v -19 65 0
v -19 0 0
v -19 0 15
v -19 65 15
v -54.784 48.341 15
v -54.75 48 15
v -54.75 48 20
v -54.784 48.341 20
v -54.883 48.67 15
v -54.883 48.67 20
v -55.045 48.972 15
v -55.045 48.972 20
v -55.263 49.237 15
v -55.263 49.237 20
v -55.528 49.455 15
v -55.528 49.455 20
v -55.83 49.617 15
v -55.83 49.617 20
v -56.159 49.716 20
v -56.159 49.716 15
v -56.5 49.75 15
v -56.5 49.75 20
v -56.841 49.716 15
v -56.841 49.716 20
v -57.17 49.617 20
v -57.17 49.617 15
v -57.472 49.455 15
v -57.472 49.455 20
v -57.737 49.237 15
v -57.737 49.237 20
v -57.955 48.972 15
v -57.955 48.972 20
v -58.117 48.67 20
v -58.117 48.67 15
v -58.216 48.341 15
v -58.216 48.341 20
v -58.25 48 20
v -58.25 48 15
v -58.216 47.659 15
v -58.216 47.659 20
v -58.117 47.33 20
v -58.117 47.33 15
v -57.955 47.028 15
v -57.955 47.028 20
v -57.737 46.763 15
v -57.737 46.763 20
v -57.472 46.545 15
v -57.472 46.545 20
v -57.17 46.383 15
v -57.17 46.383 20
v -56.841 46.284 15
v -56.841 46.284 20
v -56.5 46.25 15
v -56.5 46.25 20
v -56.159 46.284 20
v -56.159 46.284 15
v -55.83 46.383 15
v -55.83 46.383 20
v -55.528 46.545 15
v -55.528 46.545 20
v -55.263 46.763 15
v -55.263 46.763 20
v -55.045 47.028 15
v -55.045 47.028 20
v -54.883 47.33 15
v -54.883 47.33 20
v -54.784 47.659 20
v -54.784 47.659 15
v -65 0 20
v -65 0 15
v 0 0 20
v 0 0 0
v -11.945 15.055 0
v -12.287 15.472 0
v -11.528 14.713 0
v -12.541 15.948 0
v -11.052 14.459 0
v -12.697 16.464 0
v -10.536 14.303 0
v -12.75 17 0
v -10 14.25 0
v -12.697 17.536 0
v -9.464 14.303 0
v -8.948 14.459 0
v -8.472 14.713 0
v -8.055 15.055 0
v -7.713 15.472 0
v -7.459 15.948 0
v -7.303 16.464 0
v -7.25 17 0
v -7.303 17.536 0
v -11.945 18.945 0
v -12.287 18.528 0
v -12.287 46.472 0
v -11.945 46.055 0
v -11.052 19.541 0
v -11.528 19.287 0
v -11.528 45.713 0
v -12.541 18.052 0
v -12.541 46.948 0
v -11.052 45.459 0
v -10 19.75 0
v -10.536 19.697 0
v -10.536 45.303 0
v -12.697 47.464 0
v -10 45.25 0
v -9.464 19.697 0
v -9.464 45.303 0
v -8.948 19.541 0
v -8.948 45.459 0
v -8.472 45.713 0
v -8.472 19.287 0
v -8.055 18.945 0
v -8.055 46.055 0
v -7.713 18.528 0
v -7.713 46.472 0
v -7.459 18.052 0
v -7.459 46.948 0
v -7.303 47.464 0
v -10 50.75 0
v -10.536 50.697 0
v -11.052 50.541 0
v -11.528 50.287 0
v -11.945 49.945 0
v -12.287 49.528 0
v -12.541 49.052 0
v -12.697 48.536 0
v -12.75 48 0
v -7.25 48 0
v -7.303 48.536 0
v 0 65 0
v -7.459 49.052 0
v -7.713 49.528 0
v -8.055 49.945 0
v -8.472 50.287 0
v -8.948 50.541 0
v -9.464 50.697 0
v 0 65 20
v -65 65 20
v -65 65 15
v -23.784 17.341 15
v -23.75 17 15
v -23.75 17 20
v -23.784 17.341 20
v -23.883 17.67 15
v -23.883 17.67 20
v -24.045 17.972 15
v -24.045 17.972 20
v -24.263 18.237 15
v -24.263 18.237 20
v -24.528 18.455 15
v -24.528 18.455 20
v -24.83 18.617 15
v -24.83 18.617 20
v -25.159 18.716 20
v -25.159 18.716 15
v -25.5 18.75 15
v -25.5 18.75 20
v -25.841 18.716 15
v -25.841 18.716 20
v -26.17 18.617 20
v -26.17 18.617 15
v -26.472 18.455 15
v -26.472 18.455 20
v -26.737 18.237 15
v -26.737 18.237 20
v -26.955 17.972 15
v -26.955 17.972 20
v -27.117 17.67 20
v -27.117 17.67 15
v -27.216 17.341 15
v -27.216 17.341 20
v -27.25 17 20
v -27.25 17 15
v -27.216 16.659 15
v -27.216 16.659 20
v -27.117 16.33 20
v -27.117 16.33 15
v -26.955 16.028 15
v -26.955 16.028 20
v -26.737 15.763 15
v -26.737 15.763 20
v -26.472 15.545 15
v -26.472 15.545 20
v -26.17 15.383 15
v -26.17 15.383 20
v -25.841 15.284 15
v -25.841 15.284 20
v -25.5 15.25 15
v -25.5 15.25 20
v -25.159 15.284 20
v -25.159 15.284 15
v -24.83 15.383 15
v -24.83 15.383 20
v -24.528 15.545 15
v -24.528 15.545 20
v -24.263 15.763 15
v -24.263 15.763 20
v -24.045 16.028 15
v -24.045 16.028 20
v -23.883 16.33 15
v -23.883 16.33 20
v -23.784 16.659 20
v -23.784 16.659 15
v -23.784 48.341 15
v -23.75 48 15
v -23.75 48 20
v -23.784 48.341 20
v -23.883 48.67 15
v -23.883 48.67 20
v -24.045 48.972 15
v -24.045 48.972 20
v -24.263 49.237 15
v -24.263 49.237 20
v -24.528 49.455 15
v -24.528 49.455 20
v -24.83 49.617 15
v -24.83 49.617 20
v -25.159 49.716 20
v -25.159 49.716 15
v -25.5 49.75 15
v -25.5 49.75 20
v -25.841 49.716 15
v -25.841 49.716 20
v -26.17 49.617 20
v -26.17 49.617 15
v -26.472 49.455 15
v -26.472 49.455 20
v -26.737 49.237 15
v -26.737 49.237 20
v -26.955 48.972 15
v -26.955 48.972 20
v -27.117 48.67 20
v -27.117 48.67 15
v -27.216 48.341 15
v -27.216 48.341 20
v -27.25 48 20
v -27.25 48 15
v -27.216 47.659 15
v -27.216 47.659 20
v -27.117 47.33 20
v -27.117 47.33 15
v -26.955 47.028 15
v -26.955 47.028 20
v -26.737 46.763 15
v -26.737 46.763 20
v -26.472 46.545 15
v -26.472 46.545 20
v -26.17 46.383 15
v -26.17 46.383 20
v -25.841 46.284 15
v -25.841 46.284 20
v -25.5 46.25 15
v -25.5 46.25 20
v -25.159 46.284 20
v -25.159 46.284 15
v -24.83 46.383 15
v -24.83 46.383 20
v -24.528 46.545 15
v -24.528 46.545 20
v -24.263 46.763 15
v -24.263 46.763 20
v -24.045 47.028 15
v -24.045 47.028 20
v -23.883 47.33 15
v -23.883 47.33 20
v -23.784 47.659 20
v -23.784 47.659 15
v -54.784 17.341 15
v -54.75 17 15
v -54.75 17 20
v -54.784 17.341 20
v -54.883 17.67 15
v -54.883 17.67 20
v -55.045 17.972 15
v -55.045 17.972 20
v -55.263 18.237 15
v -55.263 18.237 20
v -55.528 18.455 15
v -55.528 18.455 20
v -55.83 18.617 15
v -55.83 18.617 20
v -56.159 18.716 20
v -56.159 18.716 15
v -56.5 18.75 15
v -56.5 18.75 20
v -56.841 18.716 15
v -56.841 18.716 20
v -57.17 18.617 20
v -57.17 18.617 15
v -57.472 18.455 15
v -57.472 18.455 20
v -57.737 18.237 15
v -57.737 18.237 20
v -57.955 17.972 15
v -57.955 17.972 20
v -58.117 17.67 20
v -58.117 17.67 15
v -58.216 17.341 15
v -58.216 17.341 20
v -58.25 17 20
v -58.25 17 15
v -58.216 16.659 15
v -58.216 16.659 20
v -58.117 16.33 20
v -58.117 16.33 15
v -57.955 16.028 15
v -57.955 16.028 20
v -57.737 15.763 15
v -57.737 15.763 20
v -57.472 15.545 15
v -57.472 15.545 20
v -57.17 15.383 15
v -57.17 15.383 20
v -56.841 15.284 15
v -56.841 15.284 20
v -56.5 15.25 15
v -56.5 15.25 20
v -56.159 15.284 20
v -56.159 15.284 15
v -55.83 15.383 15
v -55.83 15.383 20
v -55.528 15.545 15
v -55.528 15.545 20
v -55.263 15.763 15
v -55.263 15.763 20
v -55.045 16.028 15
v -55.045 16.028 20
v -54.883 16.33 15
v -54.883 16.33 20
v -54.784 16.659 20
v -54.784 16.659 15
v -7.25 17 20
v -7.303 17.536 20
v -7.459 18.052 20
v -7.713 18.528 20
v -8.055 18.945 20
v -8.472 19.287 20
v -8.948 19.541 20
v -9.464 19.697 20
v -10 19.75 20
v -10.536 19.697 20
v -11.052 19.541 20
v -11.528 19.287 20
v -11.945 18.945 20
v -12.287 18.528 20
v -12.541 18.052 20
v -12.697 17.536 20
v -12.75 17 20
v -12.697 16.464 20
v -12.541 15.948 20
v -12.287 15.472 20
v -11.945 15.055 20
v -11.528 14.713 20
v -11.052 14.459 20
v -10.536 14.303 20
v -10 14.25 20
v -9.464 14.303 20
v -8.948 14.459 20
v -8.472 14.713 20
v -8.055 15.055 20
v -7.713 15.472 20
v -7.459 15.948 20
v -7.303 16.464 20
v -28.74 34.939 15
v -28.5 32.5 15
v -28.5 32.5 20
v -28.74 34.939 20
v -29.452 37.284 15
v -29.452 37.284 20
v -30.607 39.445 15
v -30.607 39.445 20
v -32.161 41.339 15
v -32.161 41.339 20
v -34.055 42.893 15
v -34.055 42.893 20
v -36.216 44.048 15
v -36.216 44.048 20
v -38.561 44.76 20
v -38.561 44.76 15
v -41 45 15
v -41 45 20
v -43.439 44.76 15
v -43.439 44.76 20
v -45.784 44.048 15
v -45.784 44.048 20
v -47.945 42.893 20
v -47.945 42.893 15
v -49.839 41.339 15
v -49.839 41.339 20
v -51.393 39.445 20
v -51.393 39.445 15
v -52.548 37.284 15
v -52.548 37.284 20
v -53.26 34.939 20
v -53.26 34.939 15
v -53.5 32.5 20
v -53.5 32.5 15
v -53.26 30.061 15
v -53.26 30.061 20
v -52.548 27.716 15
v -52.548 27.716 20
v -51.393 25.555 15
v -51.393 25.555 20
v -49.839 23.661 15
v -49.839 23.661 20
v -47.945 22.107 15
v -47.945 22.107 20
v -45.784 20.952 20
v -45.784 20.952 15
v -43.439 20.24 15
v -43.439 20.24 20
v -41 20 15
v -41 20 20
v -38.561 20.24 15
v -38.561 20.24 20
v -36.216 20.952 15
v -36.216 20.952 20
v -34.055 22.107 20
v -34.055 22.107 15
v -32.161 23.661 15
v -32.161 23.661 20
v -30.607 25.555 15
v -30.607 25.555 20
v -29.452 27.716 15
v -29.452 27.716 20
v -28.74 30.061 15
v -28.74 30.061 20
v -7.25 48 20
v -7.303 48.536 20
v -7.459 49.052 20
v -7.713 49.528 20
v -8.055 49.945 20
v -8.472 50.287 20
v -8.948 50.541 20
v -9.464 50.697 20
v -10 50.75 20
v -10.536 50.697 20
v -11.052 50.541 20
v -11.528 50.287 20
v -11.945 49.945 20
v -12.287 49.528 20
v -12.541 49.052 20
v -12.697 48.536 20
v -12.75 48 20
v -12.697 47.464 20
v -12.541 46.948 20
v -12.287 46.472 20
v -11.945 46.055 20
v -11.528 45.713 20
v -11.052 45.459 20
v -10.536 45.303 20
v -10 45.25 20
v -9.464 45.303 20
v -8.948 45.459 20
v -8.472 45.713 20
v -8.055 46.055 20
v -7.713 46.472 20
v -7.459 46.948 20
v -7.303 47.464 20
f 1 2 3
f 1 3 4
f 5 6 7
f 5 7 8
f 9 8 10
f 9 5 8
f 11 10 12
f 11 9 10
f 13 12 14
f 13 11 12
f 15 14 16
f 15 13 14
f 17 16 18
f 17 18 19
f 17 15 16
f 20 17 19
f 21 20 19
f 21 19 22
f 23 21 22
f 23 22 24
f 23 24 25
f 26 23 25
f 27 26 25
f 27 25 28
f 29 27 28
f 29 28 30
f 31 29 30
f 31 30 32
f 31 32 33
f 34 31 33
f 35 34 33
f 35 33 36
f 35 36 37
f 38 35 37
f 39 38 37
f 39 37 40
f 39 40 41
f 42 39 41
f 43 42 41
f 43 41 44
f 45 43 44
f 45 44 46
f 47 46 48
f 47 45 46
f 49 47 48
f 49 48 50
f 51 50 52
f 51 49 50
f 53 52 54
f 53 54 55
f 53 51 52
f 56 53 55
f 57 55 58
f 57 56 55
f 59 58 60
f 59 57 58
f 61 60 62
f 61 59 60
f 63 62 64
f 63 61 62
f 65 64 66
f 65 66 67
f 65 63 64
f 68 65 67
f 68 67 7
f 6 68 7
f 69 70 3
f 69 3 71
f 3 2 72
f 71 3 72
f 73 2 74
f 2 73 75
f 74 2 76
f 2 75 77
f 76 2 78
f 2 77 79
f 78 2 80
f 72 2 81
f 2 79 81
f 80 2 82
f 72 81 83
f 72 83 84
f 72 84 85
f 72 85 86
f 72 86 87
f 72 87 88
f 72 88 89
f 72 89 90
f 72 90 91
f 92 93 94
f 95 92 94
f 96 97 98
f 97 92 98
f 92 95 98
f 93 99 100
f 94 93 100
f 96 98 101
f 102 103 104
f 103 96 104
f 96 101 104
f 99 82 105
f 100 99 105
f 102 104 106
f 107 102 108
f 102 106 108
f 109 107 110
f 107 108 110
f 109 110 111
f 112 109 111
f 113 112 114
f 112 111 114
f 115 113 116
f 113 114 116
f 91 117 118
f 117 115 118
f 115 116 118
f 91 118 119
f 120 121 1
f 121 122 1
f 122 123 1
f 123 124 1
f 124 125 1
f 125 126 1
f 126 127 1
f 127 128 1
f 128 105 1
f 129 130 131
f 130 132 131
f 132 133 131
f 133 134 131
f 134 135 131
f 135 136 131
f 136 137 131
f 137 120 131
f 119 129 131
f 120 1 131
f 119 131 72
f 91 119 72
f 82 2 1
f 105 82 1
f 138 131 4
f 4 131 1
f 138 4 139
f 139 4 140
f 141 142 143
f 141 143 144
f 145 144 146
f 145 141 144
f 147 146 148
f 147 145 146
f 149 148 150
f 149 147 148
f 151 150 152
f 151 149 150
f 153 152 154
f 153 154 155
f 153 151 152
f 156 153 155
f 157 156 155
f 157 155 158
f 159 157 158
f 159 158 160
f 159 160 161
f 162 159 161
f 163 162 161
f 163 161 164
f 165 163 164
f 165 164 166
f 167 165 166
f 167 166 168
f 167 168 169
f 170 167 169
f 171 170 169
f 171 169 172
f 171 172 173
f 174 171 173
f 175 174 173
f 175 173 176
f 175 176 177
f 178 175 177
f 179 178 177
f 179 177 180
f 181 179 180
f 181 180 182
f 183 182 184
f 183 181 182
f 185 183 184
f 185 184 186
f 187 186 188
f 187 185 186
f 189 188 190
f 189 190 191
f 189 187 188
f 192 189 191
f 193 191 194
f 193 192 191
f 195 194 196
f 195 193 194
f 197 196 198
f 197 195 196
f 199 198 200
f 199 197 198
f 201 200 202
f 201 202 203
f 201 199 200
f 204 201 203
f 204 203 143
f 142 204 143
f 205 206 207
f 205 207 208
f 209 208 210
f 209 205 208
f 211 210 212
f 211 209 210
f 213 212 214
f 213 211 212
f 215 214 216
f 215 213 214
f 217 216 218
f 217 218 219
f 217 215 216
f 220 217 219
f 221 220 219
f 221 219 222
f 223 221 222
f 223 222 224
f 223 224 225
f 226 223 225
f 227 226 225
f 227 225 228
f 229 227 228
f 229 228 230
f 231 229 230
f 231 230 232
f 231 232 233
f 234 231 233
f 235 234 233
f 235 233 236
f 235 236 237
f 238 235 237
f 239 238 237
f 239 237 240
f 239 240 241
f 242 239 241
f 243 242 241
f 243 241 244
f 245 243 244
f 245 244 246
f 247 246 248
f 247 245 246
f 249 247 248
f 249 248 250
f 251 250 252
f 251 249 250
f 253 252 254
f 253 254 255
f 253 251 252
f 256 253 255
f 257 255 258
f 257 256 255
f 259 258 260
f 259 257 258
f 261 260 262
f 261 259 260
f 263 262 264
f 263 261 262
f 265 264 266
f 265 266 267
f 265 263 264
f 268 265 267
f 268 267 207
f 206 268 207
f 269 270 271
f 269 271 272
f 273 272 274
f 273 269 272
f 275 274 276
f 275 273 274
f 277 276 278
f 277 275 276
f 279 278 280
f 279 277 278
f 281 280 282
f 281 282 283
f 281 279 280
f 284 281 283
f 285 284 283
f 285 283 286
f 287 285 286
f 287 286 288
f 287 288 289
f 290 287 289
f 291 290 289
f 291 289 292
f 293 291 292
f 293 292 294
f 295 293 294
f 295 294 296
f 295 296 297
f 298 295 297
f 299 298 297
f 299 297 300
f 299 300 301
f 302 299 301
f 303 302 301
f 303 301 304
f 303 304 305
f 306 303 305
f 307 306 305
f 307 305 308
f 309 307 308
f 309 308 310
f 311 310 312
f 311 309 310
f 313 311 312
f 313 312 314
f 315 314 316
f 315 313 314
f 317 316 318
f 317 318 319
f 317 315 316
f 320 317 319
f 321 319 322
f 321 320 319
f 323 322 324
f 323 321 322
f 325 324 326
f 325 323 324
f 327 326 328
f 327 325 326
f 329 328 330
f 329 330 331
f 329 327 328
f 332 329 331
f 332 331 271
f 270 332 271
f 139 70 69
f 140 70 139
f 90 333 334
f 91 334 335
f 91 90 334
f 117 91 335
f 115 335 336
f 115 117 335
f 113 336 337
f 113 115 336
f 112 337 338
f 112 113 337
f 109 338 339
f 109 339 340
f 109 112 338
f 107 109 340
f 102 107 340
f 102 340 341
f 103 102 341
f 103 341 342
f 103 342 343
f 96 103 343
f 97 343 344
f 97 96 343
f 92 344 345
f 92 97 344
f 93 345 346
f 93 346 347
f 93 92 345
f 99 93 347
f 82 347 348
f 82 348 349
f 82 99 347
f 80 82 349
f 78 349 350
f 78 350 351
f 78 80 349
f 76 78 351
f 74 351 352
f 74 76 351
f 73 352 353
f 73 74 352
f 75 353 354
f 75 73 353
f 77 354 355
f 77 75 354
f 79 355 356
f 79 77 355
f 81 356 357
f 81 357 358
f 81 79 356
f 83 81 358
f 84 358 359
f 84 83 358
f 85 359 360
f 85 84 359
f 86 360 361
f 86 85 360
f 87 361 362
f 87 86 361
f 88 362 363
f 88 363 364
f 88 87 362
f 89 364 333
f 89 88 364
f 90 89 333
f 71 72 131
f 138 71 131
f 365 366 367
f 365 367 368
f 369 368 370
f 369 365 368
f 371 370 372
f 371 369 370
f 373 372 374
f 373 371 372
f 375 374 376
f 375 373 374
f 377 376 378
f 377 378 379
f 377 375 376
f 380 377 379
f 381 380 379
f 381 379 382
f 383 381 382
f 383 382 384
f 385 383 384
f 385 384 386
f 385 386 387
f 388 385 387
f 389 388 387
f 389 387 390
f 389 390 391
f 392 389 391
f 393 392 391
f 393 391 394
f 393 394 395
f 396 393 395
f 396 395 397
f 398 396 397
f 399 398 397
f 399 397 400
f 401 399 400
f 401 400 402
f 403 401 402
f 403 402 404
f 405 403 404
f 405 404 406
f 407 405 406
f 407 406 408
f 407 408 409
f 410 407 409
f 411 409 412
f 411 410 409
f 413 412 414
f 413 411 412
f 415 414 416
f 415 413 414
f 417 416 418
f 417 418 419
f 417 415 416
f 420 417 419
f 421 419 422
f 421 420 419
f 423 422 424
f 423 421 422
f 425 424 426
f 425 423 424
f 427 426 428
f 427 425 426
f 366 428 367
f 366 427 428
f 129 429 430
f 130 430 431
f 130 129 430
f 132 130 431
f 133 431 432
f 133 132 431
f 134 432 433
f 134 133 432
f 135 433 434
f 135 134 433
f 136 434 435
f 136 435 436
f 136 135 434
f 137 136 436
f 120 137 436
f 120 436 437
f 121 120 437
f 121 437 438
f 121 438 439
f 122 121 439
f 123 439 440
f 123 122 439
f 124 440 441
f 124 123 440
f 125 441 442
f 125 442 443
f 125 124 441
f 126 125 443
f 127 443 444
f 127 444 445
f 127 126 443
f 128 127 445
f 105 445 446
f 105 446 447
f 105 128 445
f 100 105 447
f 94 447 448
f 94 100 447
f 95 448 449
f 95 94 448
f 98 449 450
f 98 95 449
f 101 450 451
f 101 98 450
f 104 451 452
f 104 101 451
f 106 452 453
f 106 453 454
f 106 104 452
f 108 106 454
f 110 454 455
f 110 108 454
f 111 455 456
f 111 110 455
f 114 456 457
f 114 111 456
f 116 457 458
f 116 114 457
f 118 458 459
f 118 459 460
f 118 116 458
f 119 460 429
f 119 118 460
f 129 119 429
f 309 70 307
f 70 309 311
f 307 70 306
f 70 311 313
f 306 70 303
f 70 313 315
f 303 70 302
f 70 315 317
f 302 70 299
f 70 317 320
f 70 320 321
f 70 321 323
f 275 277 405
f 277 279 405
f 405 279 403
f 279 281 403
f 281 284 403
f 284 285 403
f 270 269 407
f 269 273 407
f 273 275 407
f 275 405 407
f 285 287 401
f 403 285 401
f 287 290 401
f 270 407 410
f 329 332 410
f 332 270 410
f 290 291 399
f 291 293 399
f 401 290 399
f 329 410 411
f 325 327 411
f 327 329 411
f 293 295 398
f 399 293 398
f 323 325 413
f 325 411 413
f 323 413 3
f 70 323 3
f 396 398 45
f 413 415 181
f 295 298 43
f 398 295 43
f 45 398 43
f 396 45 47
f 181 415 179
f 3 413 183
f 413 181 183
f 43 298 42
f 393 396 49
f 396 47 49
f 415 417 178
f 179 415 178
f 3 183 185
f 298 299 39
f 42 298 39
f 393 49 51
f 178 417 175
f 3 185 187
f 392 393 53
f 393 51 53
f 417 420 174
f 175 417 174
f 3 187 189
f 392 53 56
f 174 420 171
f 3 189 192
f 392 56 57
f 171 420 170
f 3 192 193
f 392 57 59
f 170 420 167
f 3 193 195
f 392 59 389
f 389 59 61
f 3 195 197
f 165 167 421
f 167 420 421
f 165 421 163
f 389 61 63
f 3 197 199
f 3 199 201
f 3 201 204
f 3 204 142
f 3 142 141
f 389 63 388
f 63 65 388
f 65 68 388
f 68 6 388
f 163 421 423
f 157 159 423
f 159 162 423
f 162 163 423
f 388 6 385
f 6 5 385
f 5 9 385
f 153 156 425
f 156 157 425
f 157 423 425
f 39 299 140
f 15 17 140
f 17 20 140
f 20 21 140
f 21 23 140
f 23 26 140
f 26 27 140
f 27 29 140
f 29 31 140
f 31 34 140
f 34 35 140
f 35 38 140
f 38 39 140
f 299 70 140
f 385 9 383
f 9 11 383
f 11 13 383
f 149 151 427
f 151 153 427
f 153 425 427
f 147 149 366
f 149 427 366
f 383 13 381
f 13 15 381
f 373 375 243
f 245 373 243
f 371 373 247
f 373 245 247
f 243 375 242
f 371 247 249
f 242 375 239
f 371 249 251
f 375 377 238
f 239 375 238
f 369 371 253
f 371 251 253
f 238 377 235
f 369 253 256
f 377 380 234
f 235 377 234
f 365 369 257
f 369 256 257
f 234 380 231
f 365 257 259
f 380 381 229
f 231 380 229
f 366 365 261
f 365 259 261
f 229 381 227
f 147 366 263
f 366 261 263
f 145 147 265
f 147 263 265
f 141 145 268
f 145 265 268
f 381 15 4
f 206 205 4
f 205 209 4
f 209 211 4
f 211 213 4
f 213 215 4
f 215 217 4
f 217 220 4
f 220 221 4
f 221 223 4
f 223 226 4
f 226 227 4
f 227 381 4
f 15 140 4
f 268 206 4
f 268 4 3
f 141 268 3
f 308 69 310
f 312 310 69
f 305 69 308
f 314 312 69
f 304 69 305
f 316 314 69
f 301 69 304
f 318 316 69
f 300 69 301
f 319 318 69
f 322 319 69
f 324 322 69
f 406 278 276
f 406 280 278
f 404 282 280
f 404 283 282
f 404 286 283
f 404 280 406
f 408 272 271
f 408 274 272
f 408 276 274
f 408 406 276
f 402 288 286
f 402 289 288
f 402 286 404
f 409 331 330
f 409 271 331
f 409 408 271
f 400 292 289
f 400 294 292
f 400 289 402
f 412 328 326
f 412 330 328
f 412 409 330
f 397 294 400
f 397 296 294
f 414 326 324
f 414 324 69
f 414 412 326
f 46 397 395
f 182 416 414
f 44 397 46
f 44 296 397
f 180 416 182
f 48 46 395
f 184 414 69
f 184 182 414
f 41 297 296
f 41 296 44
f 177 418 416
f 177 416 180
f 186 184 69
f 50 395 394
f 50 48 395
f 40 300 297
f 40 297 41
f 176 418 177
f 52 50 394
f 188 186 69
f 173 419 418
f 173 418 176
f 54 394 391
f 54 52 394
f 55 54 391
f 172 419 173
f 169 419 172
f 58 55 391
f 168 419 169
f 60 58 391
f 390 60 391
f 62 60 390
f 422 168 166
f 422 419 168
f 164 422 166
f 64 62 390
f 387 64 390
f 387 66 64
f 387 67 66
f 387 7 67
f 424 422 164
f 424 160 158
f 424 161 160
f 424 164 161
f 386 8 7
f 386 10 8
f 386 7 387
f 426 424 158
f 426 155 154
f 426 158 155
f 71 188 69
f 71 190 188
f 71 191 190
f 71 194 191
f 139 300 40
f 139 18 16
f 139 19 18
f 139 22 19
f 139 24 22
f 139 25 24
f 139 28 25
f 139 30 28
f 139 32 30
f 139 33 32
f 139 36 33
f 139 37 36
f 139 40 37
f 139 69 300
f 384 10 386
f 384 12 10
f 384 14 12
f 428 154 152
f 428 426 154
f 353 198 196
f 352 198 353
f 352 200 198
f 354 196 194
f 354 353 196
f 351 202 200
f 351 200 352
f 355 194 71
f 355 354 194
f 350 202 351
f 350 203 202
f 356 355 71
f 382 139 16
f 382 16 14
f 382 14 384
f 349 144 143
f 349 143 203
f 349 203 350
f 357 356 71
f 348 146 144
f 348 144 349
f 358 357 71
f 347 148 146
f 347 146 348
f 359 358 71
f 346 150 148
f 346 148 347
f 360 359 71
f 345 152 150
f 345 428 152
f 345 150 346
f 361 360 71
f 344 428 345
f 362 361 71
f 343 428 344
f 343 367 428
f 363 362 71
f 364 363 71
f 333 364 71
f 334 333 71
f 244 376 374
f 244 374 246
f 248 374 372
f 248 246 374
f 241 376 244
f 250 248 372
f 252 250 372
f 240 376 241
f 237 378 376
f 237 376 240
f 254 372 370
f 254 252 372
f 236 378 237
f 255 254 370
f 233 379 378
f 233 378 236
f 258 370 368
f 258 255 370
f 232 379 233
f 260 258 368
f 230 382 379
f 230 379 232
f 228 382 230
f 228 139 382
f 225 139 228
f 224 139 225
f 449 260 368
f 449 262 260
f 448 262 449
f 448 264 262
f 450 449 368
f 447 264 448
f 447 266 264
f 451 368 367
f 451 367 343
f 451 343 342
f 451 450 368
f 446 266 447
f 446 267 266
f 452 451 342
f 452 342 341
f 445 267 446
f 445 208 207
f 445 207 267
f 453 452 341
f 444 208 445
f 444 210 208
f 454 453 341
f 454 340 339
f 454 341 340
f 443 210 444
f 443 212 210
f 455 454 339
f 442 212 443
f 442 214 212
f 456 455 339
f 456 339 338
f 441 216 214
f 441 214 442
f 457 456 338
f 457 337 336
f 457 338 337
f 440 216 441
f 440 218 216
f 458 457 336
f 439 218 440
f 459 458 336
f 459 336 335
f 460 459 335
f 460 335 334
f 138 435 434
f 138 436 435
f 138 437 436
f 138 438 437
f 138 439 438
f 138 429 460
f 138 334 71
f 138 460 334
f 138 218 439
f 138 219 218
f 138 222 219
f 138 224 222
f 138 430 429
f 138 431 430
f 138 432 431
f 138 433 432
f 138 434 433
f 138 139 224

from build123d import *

# Parameters (mm, degrees)
F0_W     = 19
F0_H     = 65
F0_R     = 2.75
F0_W_2   = 46
F0_R_2   = 1.75
F0_R_3   = 12.5
F1_DEPTH = 20
F2_DEPTH = 15


with BuildPart() as f1:
    # F0 (on Top) → F1 (new body)
    with BuildSketch(Plane.XY):
        with Locations((-9.5, 32.5)):
            Rectangle(F0_W, F0_H)
        with Locations((-10, 17)):
            Circle(F0_R, mode=Mode.SUBTRACT)
        with Locations((-10, 48)):
            Circle(F0_R, mode=Mode.SUBTRACT)
        with Locations((-42, 32.5)):
            Rectangle(F0_W_2, F0_H)
        with Locations((-56.5, 17)):
            Circle(F0_R_2, mode=Mode.SUBTRACT)
        with Locations((-25.5, 17)):
            Circle(F0_R_2, mode=Mode.SUBTRACT)
        with Locations((-56.5, 48)):
            Circle(F0_R_2, mode=Mode.SUBTRACT)
        with Locations((-41, 32.5)):
            Circle(F0_R_3, mode=Mode.SUBTRACT)
        with Locations((-25.5, 48)):
            Circle(F0_R_2, mode=Mode.SUBTRACT)
    extrude(amount=F1_DEPTH)

    # F0 (on Top) → F2 (cut)
    with BuildSketch(Plane.XY):
        with Locations((-42, 32.5)):
            Rectangle(F0_W_2, F0_H)
        with Locations((-56.5, 17)):
            Circle(F0_R_2, mode=Mode.SUBTRACT)
        with Locations((-25.5, 17)):
            Circle(F0_R_2, mode=Mode.SUBTRACT)
        with Locations((-56.5, 48)):
            Circle(F0_R_2, mode=Mode.SUBTRACT)
        with Locations((-41, 32.5)):
            Circle(F0_R_3, mode=Mode.SUBTRACT)
        with Locations((-25.5, 48)):
            Circle(F0_R_2, mode=Mode.SUBTRACT)
    extrude(amount=F2_DEPTH, mode=Mode.SUBTRACT)


solid = f1.part
